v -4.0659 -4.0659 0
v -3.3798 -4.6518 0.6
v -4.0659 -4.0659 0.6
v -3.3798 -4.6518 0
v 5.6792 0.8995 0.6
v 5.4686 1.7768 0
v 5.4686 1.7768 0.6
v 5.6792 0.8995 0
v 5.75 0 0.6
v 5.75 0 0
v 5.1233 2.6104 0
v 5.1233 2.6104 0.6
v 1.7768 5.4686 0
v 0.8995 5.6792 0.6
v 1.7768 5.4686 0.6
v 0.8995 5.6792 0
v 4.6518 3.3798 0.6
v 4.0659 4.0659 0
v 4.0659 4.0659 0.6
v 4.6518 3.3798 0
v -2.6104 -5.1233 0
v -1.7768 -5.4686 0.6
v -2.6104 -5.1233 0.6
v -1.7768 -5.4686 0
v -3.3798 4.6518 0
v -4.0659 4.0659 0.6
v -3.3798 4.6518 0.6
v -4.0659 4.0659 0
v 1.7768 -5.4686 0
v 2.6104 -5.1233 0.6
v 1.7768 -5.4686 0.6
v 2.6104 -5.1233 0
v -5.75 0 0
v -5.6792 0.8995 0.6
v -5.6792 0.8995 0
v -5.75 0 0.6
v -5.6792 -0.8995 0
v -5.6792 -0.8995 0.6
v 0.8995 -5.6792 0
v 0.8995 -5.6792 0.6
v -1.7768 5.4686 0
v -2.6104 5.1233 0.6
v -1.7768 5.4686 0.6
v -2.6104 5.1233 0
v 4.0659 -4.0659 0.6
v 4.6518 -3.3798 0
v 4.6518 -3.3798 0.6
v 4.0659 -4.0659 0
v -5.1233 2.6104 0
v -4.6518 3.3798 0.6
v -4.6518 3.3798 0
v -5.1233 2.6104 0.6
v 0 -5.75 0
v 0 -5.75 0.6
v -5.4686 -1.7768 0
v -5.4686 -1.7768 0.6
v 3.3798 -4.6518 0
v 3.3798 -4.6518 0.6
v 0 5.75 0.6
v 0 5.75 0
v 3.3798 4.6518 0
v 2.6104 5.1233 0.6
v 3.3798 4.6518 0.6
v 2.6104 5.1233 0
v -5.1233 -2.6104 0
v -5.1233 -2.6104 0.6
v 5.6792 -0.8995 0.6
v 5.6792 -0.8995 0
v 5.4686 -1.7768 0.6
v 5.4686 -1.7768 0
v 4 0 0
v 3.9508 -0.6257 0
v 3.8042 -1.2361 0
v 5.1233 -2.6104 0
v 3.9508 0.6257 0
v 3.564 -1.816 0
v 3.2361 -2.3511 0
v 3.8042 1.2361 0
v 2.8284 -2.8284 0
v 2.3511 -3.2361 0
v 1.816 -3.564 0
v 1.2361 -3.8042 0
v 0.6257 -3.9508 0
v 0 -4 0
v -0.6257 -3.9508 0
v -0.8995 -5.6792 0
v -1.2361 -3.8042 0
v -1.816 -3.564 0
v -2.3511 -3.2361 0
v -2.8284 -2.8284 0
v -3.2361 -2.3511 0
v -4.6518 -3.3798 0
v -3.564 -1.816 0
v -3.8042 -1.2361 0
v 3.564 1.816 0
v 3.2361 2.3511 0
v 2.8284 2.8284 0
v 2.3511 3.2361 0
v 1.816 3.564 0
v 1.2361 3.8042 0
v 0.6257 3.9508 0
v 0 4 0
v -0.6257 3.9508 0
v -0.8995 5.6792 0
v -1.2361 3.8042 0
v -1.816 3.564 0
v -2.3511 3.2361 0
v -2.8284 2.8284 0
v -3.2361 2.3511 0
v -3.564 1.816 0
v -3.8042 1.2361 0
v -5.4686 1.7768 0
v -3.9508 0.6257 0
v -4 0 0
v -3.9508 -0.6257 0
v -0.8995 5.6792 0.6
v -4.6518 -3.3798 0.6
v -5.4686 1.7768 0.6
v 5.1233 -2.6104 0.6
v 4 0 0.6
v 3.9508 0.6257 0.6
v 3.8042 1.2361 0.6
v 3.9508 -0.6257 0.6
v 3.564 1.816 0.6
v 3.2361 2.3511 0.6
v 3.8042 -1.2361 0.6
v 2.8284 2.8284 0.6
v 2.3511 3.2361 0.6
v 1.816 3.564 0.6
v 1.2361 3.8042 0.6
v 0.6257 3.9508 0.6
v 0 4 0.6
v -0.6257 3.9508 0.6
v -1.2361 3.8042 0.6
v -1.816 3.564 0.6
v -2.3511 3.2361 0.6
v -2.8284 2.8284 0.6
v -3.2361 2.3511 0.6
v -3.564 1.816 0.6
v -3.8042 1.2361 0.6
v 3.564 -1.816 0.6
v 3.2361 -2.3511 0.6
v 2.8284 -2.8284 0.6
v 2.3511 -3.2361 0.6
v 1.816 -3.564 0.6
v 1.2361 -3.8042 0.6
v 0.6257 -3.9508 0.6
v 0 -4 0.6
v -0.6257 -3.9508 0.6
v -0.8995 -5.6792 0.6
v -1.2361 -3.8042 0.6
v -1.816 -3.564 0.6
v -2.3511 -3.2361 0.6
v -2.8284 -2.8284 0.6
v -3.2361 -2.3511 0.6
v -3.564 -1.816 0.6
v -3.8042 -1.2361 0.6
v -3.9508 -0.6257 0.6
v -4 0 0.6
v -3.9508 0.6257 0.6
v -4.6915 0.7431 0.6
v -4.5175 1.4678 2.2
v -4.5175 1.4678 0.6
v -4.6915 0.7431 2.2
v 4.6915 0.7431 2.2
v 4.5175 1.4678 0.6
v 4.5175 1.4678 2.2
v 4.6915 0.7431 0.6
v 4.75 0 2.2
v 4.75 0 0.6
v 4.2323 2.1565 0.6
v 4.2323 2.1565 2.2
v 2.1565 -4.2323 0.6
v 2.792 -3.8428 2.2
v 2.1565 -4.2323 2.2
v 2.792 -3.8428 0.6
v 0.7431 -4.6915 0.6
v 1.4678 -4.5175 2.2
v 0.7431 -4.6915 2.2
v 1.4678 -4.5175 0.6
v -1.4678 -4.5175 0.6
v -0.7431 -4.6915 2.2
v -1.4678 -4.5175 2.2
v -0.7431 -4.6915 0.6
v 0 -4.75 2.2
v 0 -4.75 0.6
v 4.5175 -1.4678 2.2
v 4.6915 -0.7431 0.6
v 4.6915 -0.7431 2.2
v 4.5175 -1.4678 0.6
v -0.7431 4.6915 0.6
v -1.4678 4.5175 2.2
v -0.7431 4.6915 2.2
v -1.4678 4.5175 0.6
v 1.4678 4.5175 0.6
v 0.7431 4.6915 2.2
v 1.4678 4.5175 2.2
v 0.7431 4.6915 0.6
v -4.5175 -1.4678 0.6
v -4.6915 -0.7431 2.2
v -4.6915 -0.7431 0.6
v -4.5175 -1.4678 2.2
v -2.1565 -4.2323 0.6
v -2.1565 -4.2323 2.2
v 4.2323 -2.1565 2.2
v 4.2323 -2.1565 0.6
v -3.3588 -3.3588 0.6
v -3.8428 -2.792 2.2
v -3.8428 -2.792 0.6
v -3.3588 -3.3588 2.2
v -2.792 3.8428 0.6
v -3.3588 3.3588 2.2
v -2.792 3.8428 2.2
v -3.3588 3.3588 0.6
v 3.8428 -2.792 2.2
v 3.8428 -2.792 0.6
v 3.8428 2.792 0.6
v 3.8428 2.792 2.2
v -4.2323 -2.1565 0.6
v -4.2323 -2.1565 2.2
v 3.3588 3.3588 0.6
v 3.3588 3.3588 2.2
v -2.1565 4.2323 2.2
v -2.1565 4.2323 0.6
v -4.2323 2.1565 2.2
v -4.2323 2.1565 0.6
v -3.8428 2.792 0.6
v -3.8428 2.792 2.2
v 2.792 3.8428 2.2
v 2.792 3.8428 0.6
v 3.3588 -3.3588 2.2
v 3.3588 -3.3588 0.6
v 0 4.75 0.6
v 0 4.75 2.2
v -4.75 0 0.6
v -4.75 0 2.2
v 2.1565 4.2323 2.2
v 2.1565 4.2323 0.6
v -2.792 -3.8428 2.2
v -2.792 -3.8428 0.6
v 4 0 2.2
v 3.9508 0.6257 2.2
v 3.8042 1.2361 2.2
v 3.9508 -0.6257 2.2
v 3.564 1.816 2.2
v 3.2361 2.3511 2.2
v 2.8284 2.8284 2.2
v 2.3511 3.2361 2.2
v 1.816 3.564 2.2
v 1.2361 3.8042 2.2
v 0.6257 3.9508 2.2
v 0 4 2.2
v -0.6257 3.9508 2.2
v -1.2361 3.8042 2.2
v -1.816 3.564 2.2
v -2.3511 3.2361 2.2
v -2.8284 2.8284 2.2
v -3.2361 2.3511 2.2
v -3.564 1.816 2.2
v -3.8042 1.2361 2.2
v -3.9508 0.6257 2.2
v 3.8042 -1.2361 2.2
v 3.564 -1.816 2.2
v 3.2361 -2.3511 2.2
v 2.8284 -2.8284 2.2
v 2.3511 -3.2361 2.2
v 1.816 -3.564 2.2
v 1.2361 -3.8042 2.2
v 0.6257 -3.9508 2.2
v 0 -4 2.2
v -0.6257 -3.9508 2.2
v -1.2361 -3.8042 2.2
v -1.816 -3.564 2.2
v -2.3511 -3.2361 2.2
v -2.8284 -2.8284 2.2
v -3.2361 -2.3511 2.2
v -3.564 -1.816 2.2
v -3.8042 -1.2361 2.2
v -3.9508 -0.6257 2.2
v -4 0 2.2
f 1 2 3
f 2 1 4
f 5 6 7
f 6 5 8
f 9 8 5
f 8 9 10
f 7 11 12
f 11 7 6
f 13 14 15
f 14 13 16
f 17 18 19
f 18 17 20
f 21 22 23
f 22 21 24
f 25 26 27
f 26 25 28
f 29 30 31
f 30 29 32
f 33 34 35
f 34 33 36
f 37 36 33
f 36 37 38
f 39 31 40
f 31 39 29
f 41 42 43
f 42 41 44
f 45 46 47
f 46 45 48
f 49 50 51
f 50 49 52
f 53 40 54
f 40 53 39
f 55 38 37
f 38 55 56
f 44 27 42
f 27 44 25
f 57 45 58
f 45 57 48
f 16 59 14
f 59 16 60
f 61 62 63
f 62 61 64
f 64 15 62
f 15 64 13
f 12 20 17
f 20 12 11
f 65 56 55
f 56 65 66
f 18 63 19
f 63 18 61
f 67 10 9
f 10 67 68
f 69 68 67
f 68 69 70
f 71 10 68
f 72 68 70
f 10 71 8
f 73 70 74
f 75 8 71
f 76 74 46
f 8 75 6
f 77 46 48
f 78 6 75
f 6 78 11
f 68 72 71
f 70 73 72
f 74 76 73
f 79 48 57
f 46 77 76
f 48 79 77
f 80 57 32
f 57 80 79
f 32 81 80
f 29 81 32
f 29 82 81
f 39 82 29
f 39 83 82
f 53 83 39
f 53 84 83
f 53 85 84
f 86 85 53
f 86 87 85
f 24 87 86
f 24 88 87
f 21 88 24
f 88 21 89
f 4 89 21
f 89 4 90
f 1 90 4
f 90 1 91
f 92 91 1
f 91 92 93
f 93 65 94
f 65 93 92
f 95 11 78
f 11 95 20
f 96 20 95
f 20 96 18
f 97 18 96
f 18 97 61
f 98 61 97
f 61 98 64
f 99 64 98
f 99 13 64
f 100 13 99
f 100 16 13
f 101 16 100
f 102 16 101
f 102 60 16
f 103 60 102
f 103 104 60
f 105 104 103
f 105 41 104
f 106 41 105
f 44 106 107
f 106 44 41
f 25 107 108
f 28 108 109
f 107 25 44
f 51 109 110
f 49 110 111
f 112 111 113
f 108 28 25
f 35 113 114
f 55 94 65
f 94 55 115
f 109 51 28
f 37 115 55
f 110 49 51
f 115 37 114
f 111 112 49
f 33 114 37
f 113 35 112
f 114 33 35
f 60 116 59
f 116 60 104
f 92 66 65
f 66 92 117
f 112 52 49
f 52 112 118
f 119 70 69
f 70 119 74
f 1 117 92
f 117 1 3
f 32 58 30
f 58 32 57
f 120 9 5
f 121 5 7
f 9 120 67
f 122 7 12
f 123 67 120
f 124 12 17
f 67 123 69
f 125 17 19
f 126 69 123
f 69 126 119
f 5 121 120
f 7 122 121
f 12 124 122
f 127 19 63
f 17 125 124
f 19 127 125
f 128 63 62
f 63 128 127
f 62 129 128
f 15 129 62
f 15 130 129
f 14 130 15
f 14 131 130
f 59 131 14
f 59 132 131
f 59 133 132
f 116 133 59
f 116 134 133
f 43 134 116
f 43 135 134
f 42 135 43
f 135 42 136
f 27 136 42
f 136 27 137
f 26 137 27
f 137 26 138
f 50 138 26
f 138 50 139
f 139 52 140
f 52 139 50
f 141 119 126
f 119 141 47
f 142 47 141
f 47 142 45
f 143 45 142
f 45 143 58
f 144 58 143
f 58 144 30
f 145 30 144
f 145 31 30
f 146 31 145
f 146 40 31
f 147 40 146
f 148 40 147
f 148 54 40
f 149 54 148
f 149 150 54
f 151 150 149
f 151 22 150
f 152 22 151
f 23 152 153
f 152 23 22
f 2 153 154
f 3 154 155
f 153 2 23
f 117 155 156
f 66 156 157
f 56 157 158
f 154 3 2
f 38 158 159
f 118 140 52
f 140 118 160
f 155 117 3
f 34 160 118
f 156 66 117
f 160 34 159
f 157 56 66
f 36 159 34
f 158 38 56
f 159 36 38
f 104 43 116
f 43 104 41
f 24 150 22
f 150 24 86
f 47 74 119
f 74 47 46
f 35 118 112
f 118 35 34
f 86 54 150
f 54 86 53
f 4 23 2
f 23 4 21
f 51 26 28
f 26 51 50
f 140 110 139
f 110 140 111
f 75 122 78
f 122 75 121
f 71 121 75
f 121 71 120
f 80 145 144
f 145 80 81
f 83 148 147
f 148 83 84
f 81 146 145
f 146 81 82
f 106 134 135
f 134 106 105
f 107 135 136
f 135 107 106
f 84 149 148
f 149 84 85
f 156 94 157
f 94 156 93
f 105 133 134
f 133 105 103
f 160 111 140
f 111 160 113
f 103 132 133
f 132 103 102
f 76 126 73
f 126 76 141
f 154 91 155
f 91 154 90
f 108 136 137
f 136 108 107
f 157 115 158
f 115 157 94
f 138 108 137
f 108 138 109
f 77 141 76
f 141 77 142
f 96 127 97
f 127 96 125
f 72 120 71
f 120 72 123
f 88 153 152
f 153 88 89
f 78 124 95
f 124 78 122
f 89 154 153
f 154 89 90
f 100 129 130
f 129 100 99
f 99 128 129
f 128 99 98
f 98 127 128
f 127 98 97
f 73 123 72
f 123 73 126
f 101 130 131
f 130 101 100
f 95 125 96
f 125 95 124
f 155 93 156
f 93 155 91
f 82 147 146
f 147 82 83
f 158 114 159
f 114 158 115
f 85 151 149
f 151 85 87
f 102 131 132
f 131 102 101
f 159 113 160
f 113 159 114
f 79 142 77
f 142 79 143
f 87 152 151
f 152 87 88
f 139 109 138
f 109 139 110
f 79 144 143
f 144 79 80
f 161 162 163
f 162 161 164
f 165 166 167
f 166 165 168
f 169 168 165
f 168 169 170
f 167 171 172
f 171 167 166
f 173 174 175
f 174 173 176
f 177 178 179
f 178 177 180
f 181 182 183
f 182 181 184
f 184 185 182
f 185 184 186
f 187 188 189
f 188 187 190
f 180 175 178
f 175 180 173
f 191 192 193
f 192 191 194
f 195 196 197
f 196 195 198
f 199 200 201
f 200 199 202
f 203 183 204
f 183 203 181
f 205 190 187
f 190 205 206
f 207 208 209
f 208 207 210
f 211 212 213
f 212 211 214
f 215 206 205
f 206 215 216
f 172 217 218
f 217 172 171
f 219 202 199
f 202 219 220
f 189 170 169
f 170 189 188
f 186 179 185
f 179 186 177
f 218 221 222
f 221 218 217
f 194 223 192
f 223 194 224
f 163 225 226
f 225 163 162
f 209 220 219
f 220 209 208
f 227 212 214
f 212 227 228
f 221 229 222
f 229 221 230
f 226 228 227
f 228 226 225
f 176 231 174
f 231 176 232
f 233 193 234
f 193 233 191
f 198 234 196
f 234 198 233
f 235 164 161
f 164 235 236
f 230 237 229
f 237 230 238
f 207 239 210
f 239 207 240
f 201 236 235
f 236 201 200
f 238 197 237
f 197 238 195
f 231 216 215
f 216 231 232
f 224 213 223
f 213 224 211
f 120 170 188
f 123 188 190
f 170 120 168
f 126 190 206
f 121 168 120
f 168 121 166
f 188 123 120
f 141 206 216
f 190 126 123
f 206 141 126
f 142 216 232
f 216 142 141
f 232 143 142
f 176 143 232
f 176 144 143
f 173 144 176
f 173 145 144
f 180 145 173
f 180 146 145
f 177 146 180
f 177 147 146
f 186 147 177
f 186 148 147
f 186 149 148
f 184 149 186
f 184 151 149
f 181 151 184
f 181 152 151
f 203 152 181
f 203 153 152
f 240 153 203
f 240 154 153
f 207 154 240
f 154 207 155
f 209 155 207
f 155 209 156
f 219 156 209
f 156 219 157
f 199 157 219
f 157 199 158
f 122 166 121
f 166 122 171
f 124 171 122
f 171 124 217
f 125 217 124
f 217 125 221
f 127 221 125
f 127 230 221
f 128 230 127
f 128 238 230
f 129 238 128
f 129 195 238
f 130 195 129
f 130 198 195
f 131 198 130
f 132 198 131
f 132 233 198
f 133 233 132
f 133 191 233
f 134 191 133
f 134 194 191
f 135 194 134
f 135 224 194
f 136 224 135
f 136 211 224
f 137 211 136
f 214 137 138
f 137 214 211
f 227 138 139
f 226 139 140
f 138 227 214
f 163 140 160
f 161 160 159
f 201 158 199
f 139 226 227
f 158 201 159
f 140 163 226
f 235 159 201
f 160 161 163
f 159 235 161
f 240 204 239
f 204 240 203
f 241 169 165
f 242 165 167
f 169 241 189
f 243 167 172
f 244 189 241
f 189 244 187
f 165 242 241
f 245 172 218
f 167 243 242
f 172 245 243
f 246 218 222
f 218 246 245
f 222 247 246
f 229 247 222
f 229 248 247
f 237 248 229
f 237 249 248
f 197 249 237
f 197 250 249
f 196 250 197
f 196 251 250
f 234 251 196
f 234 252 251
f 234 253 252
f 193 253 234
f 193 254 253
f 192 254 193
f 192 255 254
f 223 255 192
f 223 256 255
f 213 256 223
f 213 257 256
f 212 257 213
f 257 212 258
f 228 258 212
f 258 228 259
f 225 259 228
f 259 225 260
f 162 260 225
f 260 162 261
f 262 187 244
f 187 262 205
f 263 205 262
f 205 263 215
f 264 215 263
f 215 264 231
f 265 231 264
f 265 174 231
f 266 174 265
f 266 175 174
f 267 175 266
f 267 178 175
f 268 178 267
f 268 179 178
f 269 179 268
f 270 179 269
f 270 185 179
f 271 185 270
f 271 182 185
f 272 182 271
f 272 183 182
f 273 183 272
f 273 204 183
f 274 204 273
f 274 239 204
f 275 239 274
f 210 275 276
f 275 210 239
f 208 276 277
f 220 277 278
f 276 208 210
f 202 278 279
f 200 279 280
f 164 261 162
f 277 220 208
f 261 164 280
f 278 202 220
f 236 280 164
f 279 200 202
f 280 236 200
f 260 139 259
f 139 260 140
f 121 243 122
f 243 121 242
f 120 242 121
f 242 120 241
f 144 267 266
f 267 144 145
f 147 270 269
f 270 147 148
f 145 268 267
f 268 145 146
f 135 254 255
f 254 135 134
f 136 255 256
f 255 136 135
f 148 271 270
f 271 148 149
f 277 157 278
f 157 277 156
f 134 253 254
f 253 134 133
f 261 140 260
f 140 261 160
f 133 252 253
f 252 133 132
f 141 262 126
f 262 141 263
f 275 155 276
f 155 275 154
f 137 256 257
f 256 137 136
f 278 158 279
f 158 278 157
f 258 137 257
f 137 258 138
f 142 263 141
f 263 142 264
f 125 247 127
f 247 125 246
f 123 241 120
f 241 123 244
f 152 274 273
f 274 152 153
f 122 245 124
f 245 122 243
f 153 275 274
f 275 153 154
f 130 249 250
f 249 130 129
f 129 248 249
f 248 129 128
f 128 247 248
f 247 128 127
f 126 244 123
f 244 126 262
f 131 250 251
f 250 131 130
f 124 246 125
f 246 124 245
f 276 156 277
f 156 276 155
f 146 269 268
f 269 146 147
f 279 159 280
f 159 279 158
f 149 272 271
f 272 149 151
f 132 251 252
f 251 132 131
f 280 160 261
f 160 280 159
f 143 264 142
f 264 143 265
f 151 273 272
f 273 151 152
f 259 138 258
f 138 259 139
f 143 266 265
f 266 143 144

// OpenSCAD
// file: washer_spacer.scad
// ideally this matches the bearing spacer thickness/diameter in the roller design
washer_thickness = 0.6;
washer_diameter = 11.5;
// the inner diameter can be a bit larger to make it easier for mounting
washer_inner_diameter = 8;
spacer_thickness = 1.0;
spacer_inner_diameter = 9.5;
// this needs to be a bit larger than the bearing so the spool can't slip
spacer_diameter = 24;

$fn=40;
// main file
include <washer_spacer.scad>;

difference(){
  cylinder(r=washer_diameter/2, h=washer_thickness);
  cylinder(r=washer_inner_diameter/2, h=washer_thickness);
}
translate([0, 0, washer_thickness]){
  difference(){
    cylinder(r=spacer_inner_diameter/2, h=washer_thickness+spacer_thickness);
    cylinder(r=washer_inner_diameter/2, h=washer_thickness+spacer_thickness);
  }
}
